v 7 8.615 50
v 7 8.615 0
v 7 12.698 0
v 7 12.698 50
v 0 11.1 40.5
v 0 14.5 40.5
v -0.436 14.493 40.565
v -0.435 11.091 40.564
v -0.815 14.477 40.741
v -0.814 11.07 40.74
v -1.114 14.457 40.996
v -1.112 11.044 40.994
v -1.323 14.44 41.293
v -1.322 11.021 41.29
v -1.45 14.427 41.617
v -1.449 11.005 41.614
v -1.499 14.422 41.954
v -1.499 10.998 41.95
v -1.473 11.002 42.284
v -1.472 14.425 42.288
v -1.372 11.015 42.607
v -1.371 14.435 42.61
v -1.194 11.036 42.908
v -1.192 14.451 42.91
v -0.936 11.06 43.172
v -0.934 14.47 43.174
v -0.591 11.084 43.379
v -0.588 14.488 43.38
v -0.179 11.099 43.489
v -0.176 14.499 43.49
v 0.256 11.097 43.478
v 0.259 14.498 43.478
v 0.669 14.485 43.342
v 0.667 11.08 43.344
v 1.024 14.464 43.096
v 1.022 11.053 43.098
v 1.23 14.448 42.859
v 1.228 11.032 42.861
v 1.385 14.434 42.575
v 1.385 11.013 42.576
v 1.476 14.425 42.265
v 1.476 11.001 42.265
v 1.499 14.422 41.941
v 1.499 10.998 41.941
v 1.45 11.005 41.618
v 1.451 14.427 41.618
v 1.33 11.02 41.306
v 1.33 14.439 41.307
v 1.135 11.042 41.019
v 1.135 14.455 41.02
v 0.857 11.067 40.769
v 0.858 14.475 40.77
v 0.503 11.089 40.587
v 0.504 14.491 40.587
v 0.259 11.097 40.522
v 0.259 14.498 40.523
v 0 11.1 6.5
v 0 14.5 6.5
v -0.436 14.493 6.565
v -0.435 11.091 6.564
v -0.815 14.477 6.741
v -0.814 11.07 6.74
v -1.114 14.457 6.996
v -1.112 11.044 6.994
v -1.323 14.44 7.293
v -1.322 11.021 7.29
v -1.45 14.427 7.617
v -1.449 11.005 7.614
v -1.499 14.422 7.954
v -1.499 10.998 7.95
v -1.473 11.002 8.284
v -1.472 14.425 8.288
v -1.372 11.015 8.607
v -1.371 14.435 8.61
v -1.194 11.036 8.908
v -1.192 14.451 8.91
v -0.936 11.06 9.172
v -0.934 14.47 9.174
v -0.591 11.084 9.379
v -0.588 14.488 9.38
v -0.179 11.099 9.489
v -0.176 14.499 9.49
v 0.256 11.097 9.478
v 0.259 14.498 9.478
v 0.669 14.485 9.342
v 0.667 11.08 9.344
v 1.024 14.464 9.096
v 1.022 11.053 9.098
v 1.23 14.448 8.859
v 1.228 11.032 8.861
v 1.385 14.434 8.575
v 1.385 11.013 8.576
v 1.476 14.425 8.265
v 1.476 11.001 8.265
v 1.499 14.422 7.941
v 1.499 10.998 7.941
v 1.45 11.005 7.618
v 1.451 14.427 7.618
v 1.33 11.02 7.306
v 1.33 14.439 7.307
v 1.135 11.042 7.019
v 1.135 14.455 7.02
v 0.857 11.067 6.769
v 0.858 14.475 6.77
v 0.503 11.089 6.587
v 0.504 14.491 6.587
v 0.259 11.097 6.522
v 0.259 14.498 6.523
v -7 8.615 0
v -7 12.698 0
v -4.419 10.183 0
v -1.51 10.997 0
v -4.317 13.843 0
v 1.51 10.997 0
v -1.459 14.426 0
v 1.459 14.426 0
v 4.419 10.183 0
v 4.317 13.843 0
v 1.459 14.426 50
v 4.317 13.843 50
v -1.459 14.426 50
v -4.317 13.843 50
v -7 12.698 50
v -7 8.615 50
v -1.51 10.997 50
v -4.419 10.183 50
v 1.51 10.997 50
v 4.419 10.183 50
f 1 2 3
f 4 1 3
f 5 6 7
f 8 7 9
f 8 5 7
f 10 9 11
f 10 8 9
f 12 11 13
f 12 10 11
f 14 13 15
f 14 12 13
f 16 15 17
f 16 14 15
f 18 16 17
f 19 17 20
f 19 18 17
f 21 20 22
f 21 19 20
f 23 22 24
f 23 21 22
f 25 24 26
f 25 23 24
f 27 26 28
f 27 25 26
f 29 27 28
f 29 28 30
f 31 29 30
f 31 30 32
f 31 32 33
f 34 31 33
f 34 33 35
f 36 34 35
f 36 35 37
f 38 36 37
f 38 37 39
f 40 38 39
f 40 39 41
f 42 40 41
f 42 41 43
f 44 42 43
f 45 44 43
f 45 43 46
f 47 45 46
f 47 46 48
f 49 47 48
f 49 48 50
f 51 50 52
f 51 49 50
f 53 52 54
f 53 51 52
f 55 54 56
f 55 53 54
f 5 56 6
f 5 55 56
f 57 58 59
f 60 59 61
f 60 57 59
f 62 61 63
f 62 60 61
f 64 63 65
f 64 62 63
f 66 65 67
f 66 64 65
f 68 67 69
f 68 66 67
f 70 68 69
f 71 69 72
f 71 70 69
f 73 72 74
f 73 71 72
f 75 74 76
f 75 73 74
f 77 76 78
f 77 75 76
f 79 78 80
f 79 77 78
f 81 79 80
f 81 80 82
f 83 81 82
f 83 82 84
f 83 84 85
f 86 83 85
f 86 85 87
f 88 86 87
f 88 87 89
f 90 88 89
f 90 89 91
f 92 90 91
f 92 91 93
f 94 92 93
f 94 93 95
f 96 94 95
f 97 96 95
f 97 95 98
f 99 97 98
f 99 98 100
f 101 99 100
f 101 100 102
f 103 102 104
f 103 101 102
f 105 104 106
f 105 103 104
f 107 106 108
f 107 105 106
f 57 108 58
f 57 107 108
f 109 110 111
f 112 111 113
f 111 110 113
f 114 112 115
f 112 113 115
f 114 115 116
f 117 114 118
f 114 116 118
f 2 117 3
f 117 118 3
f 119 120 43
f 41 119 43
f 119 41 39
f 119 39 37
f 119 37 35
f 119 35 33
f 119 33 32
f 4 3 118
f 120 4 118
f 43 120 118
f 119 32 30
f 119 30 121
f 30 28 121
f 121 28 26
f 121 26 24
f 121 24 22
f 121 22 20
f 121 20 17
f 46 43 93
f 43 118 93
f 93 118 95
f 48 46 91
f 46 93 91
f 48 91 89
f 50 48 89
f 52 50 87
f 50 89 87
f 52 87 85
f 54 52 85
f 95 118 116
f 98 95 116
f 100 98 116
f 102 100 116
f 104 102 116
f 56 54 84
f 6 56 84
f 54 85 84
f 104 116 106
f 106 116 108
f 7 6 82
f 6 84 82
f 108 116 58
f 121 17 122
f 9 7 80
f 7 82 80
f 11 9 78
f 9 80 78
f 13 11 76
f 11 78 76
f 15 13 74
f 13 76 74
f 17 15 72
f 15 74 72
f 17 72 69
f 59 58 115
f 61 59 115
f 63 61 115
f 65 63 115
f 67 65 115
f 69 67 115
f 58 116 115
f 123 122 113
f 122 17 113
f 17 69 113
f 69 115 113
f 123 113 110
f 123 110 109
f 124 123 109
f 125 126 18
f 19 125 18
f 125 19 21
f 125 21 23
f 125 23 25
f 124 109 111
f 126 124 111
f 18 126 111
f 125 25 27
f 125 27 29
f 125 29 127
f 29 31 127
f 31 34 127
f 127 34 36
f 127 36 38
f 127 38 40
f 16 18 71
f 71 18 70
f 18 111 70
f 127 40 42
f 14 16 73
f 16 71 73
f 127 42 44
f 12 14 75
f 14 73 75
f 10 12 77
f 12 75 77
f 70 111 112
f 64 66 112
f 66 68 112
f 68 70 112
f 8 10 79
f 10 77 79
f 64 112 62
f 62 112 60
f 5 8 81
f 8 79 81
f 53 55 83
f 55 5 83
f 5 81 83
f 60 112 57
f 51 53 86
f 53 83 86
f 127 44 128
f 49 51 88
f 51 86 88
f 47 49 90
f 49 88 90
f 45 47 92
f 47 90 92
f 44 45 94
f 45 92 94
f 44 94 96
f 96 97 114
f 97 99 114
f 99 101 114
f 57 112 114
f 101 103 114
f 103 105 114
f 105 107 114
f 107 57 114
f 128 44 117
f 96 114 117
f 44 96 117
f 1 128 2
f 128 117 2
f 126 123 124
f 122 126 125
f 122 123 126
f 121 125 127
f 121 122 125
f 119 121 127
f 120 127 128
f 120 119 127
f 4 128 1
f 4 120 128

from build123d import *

# Parameters (mm, degrees)
BOSS_EXTRUDE1_DEPTH     = 50
CUT_EXTRUDE2_DEPTH      = 53.528563658
CUT_EXTRUDE2_DEPTH_BACK = 53.528563658
SKETCH7_R               = 1.5


with BuildPart() as part:
    # Sketch1 → Boss-Extrude1 (new body)
    with BuildSketch(Plane.XY):
        with BuildLine():
            Line((-7, 12.698425099), (-7, 8.614522622))
            ThreePointArc((-7, 8.614522622), (0, 11.1), (7, 8.614522622))
            Line((7, 8.614522622), (7, 12.698425099))
            ThreePointArc((7, 12.698425099), (0, 14.5), (-7, 12.698425099))
        make_face()
    extrude(amount=BOSS_EXTRUDE1_DEPTH)

    # Sketch7 → Cut-Extrude2 (cut, two sides: drawn at the far end of the back side and taken through both)
    with BuildSketch(Plane(origin=(0, 0, 0), x_dir=(1, 0, 0), z_dir=(0, 1, 0)).offset(-CUT_EXTRUDE2_DEPTH_BACK)):
        with Locations(Location((0, -8, 0), (0, 0, 90))):
            Circle(SKETCH7_R)
        with Locations(Location((0, -42, 0), (0, 0, 90))):
            Circle(SKETCH7_R)
    extrude(amount=CUT_EXTRUDE2_DEPTH + CUT_EXTRUDE2_DEPTH_BACK, mode=Mode.SUBTRACT)


solid = part.part
